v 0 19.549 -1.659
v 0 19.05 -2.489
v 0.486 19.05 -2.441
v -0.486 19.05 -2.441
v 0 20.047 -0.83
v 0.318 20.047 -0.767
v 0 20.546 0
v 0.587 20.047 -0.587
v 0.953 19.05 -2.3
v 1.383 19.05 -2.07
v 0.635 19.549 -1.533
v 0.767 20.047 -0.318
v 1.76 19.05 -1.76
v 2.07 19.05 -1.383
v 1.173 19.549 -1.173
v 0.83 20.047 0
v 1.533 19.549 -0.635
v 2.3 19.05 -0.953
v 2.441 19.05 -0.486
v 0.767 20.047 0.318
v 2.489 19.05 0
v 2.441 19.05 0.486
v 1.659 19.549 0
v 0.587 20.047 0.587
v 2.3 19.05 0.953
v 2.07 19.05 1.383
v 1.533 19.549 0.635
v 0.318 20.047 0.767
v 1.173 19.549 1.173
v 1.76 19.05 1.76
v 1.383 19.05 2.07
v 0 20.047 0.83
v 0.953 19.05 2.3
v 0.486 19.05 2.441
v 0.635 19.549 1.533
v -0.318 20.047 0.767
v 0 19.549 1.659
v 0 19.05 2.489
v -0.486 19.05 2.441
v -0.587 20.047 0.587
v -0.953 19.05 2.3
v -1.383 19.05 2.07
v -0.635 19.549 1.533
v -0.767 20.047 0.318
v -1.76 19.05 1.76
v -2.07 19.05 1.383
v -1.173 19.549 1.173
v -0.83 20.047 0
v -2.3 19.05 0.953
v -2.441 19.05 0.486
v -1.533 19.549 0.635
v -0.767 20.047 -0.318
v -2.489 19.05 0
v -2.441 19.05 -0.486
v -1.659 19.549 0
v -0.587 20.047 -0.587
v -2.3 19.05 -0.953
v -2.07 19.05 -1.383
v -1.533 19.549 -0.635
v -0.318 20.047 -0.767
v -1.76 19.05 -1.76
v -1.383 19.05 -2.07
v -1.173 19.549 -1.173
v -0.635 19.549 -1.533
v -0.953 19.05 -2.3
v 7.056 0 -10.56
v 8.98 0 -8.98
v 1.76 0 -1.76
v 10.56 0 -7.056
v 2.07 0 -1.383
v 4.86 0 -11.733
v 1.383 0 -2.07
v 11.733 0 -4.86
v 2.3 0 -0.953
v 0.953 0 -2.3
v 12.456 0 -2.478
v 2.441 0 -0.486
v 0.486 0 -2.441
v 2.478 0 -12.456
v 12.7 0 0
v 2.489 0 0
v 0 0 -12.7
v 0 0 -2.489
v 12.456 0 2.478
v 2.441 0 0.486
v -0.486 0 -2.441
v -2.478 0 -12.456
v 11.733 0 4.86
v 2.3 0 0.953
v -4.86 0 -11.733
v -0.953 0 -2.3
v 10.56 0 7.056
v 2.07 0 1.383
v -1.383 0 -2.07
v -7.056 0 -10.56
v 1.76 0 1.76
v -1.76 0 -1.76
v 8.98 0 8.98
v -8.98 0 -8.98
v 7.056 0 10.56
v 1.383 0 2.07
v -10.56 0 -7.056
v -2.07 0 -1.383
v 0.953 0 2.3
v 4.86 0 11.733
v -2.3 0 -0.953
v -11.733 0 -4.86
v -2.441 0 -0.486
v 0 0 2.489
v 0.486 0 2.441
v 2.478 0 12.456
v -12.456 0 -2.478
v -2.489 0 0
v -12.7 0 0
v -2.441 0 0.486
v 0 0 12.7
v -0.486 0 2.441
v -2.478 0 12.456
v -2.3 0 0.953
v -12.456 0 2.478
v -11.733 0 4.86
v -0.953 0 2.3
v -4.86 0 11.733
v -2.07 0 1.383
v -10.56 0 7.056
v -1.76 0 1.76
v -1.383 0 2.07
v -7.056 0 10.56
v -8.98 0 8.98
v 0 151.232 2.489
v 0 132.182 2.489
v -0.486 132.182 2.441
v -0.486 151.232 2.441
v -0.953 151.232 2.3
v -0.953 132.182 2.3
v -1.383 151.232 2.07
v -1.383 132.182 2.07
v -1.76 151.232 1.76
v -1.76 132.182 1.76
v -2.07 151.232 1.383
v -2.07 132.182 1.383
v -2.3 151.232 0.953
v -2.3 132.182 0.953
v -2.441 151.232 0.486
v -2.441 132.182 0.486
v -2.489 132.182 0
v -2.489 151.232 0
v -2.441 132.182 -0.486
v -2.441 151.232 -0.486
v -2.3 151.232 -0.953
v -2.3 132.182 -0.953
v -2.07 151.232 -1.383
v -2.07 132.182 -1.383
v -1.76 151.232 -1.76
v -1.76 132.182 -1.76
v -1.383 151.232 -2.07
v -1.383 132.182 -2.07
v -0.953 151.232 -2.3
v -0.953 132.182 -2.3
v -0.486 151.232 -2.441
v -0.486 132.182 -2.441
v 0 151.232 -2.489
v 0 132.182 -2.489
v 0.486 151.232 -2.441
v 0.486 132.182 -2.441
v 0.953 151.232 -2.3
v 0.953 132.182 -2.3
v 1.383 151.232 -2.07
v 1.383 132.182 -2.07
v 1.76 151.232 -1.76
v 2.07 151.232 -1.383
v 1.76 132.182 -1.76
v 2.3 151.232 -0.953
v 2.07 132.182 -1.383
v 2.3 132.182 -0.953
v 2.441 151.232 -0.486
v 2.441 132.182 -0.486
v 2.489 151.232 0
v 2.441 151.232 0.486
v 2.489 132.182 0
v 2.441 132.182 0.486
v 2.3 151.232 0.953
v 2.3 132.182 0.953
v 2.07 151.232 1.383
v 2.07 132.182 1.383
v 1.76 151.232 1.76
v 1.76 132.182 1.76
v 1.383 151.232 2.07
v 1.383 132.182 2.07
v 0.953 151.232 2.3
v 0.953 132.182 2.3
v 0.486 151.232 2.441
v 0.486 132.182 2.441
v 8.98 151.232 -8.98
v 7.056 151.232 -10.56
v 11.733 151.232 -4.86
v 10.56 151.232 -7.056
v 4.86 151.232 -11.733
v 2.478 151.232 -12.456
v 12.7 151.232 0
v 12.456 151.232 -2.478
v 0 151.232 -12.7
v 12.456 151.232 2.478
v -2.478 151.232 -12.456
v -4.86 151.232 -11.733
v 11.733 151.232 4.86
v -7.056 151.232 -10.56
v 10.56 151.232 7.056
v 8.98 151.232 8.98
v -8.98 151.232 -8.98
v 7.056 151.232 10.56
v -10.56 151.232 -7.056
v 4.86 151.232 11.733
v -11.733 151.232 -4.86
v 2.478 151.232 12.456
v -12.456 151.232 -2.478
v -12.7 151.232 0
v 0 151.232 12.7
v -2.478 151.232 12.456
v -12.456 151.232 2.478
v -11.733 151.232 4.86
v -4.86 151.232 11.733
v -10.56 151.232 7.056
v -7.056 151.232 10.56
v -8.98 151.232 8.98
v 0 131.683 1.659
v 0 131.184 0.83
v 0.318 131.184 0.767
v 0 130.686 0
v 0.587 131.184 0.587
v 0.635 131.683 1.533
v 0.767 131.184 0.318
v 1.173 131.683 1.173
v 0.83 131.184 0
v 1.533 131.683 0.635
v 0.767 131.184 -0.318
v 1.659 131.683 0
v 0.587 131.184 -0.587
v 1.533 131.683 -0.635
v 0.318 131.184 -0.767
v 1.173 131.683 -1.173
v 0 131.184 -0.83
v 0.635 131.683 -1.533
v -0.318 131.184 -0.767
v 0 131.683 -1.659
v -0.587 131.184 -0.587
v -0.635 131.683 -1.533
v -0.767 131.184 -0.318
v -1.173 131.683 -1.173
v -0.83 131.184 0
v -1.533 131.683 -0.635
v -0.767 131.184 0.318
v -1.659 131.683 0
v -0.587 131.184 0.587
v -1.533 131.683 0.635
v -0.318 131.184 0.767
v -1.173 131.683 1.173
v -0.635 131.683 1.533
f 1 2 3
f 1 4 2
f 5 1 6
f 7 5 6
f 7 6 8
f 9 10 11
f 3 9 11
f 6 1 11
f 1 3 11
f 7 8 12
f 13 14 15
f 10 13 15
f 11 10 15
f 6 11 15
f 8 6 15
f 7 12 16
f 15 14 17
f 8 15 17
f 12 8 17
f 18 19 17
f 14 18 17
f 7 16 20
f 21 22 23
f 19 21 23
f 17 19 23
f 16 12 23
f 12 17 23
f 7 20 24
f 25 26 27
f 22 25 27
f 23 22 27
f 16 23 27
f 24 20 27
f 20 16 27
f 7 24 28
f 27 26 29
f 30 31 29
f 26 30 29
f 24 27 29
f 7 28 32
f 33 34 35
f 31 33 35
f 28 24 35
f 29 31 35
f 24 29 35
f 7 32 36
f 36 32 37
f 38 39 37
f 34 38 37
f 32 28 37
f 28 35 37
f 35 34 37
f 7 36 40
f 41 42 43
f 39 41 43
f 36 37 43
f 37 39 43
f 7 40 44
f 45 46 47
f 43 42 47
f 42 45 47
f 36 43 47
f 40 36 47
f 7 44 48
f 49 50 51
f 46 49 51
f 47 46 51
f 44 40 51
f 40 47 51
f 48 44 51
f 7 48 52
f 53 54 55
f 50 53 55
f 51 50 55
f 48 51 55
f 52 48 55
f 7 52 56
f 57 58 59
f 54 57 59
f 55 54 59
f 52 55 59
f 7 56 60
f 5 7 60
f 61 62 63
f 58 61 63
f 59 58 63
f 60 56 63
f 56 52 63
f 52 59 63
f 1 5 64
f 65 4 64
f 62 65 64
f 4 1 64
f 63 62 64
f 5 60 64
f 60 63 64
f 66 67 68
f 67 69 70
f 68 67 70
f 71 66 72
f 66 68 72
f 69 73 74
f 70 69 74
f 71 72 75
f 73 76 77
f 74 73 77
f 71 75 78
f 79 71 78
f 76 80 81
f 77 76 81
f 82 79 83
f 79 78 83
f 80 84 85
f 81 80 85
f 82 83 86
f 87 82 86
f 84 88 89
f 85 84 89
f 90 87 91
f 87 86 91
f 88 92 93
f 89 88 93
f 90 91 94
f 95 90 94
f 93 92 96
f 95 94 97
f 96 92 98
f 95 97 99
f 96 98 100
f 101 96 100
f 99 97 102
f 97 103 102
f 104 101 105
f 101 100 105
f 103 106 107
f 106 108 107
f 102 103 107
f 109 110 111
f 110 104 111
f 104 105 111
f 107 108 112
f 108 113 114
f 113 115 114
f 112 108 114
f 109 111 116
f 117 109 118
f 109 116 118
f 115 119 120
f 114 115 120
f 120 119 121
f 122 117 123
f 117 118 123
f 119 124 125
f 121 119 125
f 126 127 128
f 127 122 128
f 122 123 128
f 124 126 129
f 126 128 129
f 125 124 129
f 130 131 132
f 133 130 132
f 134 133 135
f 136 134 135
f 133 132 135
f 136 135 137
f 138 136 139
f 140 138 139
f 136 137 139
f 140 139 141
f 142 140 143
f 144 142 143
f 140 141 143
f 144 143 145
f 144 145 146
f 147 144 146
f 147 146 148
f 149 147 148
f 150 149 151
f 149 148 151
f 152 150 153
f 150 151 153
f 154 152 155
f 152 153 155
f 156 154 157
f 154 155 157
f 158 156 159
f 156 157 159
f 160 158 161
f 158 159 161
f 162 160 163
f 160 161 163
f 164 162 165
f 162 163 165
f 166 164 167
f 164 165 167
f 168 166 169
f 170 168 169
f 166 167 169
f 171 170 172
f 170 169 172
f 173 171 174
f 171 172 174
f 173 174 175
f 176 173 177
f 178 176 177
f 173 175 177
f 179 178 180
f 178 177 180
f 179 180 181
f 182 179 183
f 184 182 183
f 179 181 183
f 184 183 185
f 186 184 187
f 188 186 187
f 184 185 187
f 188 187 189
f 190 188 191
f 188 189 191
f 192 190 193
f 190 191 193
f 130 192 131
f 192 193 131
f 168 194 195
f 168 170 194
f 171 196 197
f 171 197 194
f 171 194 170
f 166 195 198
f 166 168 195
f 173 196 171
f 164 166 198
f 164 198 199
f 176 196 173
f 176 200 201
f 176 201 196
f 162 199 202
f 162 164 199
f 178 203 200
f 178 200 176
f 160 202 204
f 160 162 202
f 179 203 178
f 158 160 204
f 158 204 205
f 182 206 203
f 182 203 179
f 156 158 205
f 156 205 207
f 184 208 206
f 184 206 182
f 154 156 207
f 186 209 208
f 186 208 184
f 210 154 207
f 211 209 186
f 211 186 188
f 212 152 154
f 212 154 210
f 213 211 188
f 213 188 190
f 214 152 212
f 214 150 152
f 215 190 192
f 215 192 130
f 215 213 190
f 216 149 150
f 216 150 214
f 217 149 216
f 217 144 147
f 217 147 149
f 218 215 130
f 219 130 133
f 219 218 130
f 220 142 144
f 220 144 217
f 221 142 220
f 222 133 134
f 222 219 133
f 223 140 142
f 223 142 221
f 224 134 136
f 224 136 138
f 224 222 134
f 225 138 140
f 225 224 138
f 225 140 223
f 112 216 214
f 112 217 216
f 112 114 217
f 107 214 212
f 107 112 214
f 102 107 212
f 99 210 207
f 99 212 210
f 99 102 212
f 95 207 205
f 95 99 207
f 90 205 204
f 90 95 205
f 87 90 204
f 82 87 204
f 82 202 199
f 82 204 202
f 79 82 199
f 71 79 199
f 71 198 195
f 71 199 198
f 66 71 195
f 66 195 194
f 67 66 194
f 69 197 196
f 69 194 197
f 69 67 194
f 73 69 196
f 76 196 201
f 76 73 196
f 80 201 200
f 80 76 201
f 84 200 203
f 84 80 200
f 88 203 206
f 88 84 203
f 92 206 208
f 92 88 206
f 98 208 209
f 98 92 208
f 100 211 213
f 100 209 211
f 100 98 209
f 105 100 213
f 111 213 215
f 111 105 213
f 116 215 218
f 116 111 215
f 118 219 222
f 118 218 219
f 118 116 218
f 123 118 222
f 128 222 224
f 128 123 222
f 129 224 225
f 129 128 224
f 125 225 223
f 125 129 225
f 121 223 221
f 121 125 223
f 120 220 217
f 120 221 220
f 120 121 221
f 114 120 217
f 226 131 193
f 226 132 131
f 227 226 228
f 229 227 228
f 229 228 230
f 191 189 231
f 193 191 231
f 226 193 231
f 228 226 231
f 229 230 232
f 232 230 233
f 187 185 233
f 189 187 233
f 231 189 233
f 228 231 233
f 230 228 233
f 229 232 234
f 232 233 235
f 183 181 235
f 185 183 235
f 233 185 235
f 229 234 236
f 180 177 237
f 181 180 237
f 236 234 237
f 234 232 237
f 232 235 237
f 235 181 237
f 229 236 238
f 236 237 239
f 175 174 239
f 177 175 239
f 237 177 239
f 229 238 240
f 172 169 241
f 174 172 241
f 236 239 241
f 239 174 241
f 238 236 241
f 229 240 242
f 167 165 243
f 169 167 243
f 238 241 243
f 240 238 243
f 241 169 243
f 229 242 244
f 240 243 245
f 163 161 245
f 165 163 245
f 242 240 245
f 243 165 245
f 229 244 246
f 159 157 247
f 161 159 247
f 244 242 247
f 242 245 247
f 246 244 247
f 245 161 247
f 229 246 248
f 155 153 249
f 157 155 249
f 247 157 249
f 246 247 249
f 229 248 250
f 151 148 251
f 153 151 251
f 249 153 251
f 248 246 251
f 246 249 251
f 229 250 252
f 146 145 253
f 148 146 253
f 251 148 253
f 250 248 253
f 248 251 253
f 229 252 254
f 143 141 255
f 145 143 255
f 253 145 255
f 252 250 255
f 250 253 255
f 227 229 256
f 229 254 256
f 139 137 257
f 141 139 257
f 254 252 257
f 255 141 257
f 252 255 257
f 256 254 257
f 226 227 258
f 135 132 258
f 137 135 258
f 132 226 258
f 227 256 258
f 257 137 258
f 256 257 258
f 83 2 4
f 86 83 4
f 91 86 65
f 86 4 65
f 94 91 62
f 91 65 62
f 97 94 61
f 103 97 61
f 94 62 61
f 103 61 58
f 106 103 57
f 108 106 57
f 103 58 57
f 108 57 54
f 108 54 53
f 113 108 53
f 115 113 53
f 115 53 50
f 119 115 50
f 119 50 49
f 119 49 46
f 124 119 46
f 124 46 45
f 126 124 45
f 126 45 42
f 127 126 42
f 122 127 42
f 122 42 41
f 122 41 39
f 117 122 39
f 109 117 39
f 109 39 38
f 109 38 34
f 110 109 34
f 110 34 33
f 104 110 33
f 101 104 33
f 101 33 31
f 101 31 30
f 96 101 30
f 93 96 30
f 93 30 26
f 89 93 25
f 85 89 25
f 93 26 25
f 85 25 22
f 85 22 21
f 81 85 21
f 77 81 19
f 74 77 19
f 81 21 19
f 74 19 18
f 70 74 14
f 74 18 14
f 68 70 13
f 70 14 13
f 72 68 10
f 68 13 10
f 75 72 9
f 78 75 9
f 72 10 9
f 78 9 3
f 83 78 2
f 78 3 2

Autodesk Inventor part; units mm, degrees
ref_plane "YZ Plane" through (0, 0, 0) normal (1, 0, 0) x (0, 1, 0)
ref_plane "XZ Plane" through (0, 0, 0) normal (0, 1, 0) x (-1, 0, 0)
ref_plane "XY Plane" through (0, 0, 0) normal (0, 0, 1) x (1, 0, 0)
sketch "Sketch1" plane through (0, 0, 0) normal (0, 1, 0) x (-1, 0, 0)
  circle A0 centre (0, 0) radius 12.7
  dimension "d0" = 25.4
extrude "Extrusion1" add sketch "Sketch1" along normal blind 151.2316
sketch "Sketch3" plane through (0, 151.2316, 0) normal (0, 1, 0) x (1, 0, 0)
  circle A0 centre (0, 0) radius 6.35
  dimension "d11" = 12.7
sketch "Sketch2" plane through (0, 0, 0) normal (0, -1, 0) x (1, 0, 0)
  circle A0 centre (0, 0) radius 3.175
  dimension "d3" = 6.35
hole "Hole1" at (0, 0, 0) direction (0, 1, 0) diameter 4.9784 depth 19.05 tip angle 118 thread size "1/4-20 UNC" class "2B" standard "ANSI Unified Screw Threads"
hole "Hole2" at (0, 151.2316, 0) direction (0, -1, 0) diameter 4.9784 depth 19.05 tip angle 118 thread size "1/4-20 UNC" class "2B" standard "ANSI Unified Screw Threads"
properties part number "feet type 1 part 2" material "Fiber Glass"
